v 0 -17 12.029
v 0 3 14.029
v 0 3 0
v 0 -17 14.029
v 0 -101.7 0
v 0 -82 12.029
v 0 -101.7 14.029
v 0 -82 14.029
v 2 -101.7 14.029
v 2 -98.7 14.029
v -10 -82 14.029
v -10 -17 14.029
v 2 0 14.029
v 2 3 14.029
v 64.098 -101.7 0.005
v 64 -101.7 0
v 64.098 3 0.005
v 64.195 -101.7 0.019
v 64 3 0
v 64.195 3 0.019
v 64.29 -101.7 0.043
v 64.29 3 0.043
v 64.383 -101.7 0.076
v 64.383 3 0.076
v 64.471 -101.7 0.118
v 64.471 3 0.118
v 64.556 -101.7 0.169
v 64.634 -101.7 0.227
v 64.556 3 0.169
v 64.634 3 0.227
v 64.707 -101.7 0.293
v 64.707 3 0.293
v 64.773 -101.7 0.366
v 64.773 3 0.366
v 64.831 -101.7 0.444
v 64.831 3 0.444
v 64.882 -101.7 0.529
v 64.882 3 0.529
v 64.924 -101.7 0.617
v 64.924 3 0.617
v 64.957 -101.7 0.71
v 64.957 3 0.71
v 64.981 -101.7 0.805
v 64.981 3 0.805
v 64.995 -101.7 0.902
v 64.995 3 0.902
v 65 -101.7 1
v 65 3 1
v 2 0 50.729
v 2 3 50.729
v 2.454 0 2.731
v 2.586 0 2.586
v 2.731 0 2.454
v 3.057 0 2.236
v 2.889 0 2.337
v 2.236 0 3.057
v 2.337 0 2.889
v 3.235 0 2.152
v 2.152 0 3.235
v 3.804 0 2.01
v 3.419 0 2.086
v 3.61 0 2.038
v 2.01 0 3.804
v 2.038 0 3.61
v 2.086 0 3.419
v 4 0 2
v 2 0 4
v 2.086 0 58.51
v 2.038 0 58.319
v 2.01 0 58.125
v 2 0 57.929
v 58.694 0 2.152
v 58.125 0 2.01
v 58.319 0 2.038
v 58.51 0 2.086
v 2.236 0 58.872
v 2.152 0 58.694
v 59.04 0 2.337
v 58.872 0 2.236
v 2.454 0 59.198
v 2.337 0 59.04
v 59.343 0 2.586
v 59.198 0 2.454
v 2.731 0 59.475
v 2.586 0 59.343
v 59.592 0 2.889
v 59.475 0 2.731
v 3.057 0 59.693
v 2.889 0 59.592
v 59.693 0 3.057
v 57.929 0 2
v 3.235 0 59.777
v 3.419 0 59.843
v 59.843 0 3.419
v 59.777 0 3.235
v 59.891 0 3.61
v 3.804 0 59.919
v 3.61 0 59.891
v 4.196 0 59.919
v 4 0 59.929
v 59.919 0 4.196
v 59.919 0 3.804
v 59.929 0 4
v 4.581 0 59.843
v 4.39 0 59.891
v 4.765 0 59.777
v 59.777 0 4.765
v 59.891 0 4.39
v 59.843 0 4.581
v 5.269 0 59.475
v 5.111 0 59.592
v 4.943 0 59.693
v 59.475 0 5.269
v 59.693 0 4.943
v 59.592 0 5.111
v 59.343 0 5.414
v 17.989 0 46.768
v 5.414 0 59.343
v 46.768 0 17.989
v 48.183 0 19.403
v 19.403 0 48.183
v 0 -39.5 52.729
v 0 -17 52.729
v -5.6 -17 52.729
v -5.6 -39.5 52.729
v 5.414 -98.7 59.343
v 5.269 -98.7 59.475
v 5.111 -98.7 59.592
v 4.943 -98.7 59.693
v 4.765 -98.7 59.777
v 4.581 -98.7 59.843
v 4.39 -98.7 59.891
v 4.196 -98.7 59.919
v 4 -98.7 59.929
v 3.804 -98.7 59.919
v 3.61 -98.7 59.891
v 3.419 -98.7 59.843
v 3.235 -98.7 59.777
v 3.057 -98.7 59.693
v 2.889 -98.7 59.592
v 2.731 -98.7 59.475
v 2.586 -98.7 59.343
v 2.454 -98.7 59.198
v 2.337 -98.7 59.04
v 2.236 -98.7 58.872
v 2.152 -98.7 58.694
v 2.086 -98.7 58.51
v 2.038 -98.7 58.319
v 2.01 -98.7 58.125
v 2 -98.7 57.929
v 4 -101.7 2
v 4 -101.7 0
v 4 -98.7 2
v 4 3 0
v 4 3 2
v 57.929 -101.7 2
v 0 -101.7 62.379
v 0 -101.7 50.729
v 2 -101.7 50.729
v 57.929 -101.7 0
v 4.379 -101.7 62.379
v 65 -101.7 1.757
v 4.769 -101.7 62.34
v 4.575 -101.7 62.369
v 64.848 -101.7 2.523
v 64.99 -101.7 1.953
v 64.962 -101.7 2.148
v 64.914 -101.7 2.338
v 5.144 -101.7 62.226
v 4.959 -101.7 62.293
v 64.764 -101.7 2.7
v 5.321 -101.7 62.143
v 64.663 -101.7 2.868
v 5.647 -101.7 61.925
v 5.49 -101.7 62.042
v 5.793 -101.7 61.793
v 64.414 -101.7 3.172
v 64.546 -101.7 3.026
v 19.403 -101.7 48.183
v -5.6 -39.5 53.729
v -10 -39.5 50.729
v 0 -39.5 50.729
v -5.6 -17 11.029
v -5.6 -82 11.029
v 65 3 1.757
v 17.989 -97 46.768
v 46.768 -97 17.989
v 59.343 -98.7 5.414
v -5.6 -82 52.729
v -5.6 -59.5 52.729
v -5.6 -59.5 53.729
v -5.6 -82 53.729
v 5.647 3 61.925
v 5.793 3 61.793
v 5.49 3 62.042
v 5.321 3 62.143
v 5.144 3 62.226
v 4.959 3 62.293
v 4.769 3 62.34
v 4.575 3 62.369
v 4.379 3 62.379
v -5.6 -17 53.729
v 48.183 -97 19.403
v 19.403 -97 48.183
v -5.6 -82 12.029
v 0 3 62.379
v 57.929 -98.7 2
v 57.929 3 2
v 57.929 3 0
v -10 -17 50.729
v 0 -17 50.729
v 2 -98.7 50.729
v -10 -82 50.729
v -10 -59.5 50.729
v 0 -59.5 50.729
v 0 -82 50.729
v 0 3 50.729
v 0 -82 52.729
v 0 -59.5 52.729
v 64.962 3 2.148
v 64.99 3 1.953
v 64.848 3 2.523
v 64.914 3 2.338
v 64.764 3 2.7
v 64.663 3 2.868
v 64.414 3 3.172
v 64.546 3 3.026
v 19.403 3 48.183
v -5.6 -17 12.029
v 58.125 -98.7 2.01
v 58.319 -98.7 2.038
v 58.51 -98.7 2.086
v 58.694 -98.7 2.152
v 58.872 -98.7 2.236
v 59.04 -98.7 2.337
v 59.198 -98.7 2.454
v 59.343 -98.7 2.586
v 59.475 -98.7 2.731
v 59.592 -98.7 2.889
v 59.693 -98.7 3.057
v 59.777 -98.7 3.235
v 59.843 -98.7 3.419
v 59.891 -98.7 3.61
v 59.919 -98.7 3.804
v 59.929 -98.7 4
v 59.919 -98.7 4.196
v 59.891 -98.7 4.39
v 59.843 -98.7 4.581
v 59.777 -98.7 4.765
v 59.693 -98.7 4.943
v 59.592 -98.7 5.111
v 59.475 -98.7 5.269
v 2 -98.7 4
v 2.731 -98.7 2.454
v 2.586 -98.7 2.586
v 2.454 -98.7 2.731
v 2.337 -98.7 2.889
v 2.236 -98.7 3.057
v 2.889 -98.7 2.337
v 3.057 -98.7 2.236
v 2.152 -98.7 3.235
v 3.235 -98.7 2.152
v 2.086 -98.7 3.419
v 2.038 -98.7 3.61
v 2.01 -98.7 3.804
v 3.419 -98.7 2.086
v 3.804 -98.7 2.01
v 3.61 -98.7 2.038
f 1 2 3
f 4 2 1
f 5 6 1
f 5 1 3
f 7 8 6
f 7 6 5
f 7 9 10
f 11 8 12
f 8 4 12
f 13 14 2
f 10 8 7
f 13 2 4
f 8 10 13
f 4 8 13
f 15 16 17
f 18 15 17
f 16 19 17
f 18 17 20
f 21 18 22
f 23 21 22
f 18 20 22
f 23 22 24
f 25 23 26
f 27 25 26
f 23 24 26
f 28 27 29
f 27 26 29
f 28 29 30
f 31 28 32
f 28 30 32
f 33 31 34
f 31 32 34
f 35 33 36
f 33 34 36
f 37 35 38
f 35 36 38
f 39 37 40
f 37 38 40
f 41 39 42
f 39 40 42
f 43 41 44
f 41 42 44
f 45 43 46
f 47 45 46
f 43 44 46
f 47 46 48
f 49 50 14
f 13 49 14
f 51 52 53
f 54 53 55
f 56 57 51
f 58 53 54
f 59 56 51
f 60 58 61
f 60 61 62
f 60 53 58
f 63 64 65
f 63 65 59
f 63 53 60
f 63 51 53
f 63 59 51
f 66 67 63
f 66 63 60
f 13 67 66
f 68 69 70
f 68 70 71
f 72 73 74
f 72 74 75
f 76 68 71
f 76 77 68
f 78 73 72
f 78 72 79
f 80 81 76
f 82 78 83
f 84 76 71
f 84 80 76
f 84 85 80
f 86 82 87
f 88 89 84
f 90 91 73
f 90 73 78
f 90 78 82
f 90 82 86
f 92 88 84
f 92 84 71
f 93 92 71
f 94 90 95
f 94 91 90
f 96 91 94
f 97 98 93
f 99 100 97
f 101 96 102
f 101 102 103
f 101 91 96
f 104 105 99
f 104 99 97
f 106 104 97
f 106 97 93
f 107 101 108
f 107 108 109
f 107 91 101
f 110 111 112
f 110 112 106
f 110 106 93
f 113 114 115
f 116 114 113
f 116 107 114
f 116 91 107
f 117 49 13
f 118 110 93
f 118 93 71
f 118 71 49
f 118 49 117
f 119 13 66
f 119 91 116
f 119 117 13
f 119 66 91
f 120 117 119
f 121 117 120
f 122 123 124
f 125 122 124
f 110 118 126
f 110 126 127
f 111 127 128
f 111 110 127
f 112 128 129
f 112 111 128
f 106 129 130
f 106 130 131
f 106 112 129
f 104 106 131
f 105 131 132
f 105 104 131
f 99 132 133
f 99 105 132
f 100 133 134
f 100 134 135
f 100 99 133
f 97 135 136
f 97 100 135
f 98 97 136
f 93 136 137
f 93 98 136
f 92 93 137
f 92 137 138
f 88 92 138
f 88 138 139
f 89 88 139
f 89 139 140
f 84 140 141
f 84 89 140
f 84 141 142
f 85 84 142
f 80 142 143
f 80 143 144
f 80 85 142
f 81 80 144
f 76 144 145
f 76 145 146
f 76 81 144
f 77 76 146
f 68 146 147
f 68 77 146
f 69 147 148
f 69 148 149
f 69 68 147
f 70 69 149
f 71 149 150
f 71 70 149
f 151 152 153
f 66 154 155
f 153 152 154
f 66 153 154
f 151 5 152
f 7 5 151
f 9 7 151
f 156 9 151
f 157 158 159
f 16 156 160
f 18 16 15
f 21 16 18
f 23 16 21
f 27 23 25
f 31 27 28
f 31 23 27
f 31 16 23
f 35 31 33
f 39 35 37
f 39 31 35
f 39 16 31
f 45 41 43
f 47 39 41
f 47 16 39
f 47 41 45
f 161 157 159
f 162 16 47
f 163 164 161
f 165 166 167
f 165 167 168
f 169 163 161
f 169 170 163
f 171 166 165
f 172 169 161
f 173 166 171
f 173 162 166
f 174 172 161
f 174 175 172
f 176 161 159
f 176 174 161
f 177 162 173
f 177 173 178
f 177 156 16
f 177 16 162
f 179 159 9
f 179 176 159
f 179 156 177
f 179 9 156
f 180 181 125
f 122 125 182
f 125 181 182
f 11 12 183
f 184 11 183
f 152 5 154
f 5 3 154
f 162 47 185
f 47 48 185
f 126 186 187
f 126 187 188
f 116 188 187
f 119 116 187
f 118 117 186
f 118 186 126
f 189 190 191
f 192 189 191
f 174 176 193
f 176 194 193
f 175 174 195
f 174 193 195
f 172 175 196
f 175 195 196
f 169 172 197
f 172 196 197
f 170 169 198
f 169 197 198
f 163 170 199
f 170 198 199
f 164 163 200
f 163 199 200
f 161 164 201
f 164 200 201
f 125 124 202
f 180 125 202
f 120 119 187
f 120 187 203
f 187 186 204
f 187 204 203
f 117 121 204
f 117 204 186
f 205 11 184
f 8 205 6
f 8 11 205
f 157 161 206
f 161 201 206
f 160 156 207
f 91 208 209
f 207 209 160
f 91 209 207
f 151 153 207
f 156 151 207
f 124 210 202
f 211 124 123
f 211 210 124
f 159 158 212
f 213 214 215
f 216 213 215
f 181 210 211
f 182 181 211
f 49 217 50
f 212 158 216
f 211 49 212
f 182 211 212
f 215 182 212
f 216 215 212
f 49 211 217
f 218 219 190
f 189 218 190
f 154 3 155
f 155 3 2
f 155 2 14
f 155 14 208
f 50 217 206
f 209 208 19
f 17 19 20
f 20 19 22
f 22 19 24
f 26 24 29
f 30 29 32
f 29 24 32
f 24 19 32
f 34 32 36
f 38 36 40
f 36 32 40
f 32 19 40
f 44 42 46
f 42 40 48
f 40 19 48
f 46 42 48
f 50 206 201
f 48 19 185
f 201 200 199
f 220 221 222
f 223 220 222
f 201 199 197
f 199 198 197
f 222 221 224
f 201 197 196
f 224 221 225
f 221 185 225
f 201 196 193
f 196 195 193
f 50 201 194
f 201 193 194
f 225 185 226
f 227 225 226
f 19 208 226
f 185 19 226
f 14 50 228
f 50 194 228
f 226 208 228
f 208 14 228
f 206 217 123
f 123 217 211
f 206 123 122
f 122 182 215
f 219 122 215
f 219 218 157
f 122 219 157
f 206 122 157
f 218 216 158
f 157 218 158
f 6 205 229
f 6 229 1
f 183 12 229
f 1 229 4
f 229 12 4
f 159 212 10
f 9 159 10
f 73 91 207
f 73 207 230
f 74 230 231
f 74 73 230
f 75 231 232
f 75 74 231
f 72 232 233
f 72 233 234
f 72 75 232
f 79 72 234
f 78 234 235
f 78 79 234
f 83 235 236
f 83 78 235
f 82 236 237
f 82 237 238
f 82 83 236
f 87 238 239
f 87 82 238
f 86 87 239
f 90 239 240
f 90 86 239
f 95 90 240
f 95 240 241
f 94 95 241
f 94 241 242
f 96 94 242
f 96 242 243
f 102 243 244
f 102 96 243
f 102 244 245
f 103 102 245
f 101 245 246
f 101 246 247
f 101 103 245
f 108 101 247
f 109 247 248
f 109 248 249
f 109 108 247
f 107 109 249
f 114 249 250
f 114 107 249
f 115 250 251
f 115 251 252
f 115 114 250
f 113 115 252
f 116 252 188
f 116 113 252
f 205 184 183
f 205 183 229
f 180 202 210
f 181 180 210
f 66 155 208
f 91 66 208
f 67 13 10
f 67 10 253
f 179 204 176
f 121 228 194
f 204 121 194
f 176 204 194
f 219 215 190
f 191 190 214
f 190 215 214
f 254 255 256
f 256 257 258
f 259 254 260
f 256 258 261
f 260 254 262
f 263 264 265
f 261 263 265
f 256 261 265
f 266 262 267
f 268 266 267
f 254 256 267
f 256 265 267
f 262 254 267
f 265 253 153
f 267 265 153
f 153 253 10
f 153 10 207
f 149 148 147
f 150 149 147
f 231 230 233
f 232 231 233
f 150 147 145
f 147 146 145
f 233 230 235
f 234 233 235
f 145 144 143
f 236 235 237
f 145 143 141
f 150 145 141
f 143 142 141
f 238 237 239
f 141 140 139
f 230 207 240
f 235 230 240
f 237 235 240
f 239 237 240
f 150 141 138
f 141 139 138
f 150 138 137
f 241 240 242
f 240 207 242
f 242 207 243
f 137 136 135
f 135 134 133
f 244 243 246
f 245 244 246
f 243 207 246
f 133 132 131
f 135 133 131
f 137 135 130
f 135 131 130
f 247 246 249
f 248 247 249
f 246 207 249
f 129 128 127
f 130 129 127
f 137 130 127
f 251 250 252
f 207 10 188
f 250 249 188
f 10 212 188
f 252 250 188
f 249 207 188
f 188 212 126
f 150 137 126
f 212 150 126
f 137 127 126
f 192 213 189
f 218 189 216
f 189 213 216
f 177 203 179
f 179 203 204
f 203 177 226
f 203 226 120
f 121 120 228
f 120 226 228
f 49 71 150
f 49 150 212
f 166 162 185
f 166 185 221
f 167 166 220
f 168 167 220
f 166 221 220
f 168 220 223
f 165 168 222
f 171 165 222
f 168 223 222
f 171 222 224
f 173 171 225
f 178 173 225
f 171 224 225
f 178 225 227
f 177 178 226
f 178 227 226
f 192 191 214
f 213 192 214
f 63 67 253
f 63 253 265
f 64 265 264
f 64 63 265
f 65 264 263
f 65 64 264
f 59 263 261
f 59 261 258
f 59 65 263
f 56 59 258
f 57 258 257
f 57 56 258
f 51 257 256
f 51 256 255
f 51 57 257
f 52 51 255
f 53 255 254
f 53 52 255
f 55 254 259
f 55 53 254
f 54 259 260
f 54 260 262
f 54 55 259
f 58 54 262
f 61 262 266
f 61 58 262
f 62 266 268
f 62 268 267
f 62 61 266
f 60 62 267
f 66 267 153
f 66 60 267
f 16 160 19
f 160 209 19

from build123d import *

# Parameters (mm, degrees)
F1_DEPTH      = 3
F1_DEPTH_BACK = 101.7
F2_DEPTH      = 98.7
F3_DEPTH      = 97
F4_W          = 10
F4_H          = 0.3
F4_H_2        = 20
F4_H_3        = 19.7
F5_DEPTH      = 25
F6_W          = 10
F6_H          = 20
F6_H_2        = 19.7
F7_DEPTH      = 50


with BuildPart() as f1:
    # F0 (on Front) → F1 (new body, two sides)
    with BuildSketch(Plane.XZ) as f1_sk:
        with BuildLine():
            Line((0, 52.7286796564), (0, 50.7286796564))
            Line((0, 50.7286796564), (2, 50.7286796564))
            Line((2, 50.7286796564), (2, 57.9289321881))
            ThreePointArc((2, 57.9289321881), (3.2346331353, 59.7766912532), (5.4142135624, 59.3431457505))
            Line((5.4142135624, 59.3431457505), (17.9890566593, 46.7683026536))
            Line((17.9890566593, 46.7683026536), (19.4032702217, 48.182516216))
            Line((19.4032702217, 48.182516216), (5.7928932188, 61.7928932188))
            ThreePointArc((5.7928932188, 61.7928932188), (5.1440465212, 62.2264387215), (4.3786796564, 62.3786796564))
            Line((4.3786796564, 62.3786796564), (0, 62.3786796564))
            Line((0, 62.3786796564), (0, 52.7286796564))
        make_face()
        with BuildLine():
            ThreePointArc((2, 4), (2.5857864376, 2.5857864376), (4, 2))
            Line((4, 2), (57.9289321881, 2))
            ThreePointArc((57.9289321881, 2), (59.7766912532, 3.2346331353), (59.3431457505, 5.4142135624))
            Line((59.3431457505, 5.4142135624), (46.7683026536, 17.9890566593))
            Line((46.7683026536, 17.9890566593), (17.9890566593, 46.7683026536))
            Line((17.9890566593, 46.7683026536), (5.4142135624, 59.3431457505))
            ThreePointArc((5.4142135624, 59.3431457505), (3.2346331353, 59.7766912532), (2, 57.9289321881))
            Line((2, 57.9289321881), (2, 50.7286796564))
            Line((2, 50.7286796564), (2, 14.0286796564))
            Line((2, 14.0286796564), (2, 4))
        make_face()
        with BuildLine():
            Line((57.9289321881, 2), (57.9289321881, 0))
            Line((57.9289321881, 0), (64, 0))
            ThreePointArc((64, 0), (64.7071067812, 0.2928932188), (65, 1))
            Line((65, 1), (65, 1.7573593129))
            ThreePointArc((65, 1.7573593129), (64.847759065, 2.5227261776), (64.4142135624, 3.1715728753))
            Line((64.4142135624, 3.1715728753), (48.182516216, 19.4032702217))
            Line((48.182516216, 19.4032702217), (46.7683026536, 17.9890566593))
            Line((46.7683026536, 17.9890566593), (59.3431457505, 5.4142135624))
            ThreePointArc((59.3431457505, 5.4142135624), (59.7766912532, 3.2346331353), (57.9289321881, 2))
        make_face()
        Polygon((-5.6, 12.0286796564), (0, 12.0286796564), (0, 14.0286796564), (-10, 14.0286796564), (-5.6, 11.0286796564), align=None)
        Polygon((-10, 50.7286796564), (0, 50.7286796564), (0, 52.7286796564), (-5.6, 52.7286796564), (-5.6, 53.7286796564), align=None)
        Polygon((17.9890566593, 46.7683026536), (46.7683026536, 17.9890566593), (48.182516216, 19.4032702217), (19.4032702217, 48.182516216), align=None)
        with BuildLine():
            Line((0, 12.0286796564), (0, 0))
            Line((0, 0), (4, 0))
            Line((4, 0), (4, 2))
            ThreePointArc((4, 2), (2.5857864376, 2.5857864376), (2, 4))
            Line((2, 4), (2, 14.0286796564))
            Line((2, 14.0286796564), (0, 14.0286796564))
            Line((0, 14.0286796564), (0, 12.0286796564))
        make_face()
    extrude(amount=-F1_DEPTH)
    extrude(f1_sk.sketch, amount=F1_DEPTH_BACK)

    # F0 (on Front) → F2 (cut)
    with BuildSketch(Plane.XZ):
        with BuildLine():
            ThreePointArc((2, 4), (2.5857864376, 2.5857864376), (4, 2))
            Line((4, 2), (57.9289321881, 2))
            ThreePointArc((57.9289321881, 2), (59.7766912532, 3.2346331353), (59.3431457505, 5.4142135624))
            Line((59.3431457505, 5.4142135624), (46.7683026536, 17.9890566593))
            Line((46.7683026536, 17.9890566593), (17.9890566593, 46.7683026536))
            Line((17.9890566593, 46.7683026536), (5.4142135624, 59.3431457505))
            ThreePointArc((5.4142135624, 59.3431457505), (3.2346331353, 59.7766912532), (2, 57.9289321881))
            Line((2, 57.9289321881), (2, 50.7286796564))
            Line((2, 50.7286796564), (2, 14.0286796564))
            Line((2, 14.0286796564), (2, 4))
        make_face()
    extrude(amount=F2_DEPTH, mode=Mode.SUBTRACT)

    # F0 (on Front) → F3 (cut)
    with BuildSketch(Plane.XZ):
        Polygon((17.9890566593, 46.7683026536), (46.7683026536, 17.9890566593), (48.182516216, 19.4032702217), (19.4032702217, 48.182516216), align=None)
    extrude(amount=F3_DEPTH, mode=Mode.SUBTRACT)

    # F4 (on face) → F5 (cut)
    with BuildSketch(Plane(origin=(0, 0, 50.7286796564), x_dir=(1, 0, 0), z_dir=(0, 0, -1))):
        with Locations((-5, 101.85)):
            Rectangle(F4_W, F4_H)
        Polygon((-10, 49.5), (-10, 39.5), (0, 39.5), (0, 49.5), (0, 59.5), (-10, 59.5), align=None)
        with Locations((-5, 7)):
            Rectangle(F4_W, F4_H_2)
        with Locations((-5, 91.85)):
            Rectangle(F4_W, F4_H_3)
    extrude(amount=-F5_DEPTH, mode=Mode.SUBTRACT)

    # F6 (on face) → F7 (cut)
    with BuildSketch(Plane(origin=(0, 0, 50.7286796564), x_dir=(1, 0, 0), z_dir=(0, 0, -1))):
        with Locations((-5, 7)):
            Rectangle(F6_W, F6_H)
        with Locations((-5, 91.85)):
            Rectangle(F6_W, F6_H_2)
    extrude(amount=F7_DEPTH, mode=Mode.SUBTRACT)


solid = f1.part
